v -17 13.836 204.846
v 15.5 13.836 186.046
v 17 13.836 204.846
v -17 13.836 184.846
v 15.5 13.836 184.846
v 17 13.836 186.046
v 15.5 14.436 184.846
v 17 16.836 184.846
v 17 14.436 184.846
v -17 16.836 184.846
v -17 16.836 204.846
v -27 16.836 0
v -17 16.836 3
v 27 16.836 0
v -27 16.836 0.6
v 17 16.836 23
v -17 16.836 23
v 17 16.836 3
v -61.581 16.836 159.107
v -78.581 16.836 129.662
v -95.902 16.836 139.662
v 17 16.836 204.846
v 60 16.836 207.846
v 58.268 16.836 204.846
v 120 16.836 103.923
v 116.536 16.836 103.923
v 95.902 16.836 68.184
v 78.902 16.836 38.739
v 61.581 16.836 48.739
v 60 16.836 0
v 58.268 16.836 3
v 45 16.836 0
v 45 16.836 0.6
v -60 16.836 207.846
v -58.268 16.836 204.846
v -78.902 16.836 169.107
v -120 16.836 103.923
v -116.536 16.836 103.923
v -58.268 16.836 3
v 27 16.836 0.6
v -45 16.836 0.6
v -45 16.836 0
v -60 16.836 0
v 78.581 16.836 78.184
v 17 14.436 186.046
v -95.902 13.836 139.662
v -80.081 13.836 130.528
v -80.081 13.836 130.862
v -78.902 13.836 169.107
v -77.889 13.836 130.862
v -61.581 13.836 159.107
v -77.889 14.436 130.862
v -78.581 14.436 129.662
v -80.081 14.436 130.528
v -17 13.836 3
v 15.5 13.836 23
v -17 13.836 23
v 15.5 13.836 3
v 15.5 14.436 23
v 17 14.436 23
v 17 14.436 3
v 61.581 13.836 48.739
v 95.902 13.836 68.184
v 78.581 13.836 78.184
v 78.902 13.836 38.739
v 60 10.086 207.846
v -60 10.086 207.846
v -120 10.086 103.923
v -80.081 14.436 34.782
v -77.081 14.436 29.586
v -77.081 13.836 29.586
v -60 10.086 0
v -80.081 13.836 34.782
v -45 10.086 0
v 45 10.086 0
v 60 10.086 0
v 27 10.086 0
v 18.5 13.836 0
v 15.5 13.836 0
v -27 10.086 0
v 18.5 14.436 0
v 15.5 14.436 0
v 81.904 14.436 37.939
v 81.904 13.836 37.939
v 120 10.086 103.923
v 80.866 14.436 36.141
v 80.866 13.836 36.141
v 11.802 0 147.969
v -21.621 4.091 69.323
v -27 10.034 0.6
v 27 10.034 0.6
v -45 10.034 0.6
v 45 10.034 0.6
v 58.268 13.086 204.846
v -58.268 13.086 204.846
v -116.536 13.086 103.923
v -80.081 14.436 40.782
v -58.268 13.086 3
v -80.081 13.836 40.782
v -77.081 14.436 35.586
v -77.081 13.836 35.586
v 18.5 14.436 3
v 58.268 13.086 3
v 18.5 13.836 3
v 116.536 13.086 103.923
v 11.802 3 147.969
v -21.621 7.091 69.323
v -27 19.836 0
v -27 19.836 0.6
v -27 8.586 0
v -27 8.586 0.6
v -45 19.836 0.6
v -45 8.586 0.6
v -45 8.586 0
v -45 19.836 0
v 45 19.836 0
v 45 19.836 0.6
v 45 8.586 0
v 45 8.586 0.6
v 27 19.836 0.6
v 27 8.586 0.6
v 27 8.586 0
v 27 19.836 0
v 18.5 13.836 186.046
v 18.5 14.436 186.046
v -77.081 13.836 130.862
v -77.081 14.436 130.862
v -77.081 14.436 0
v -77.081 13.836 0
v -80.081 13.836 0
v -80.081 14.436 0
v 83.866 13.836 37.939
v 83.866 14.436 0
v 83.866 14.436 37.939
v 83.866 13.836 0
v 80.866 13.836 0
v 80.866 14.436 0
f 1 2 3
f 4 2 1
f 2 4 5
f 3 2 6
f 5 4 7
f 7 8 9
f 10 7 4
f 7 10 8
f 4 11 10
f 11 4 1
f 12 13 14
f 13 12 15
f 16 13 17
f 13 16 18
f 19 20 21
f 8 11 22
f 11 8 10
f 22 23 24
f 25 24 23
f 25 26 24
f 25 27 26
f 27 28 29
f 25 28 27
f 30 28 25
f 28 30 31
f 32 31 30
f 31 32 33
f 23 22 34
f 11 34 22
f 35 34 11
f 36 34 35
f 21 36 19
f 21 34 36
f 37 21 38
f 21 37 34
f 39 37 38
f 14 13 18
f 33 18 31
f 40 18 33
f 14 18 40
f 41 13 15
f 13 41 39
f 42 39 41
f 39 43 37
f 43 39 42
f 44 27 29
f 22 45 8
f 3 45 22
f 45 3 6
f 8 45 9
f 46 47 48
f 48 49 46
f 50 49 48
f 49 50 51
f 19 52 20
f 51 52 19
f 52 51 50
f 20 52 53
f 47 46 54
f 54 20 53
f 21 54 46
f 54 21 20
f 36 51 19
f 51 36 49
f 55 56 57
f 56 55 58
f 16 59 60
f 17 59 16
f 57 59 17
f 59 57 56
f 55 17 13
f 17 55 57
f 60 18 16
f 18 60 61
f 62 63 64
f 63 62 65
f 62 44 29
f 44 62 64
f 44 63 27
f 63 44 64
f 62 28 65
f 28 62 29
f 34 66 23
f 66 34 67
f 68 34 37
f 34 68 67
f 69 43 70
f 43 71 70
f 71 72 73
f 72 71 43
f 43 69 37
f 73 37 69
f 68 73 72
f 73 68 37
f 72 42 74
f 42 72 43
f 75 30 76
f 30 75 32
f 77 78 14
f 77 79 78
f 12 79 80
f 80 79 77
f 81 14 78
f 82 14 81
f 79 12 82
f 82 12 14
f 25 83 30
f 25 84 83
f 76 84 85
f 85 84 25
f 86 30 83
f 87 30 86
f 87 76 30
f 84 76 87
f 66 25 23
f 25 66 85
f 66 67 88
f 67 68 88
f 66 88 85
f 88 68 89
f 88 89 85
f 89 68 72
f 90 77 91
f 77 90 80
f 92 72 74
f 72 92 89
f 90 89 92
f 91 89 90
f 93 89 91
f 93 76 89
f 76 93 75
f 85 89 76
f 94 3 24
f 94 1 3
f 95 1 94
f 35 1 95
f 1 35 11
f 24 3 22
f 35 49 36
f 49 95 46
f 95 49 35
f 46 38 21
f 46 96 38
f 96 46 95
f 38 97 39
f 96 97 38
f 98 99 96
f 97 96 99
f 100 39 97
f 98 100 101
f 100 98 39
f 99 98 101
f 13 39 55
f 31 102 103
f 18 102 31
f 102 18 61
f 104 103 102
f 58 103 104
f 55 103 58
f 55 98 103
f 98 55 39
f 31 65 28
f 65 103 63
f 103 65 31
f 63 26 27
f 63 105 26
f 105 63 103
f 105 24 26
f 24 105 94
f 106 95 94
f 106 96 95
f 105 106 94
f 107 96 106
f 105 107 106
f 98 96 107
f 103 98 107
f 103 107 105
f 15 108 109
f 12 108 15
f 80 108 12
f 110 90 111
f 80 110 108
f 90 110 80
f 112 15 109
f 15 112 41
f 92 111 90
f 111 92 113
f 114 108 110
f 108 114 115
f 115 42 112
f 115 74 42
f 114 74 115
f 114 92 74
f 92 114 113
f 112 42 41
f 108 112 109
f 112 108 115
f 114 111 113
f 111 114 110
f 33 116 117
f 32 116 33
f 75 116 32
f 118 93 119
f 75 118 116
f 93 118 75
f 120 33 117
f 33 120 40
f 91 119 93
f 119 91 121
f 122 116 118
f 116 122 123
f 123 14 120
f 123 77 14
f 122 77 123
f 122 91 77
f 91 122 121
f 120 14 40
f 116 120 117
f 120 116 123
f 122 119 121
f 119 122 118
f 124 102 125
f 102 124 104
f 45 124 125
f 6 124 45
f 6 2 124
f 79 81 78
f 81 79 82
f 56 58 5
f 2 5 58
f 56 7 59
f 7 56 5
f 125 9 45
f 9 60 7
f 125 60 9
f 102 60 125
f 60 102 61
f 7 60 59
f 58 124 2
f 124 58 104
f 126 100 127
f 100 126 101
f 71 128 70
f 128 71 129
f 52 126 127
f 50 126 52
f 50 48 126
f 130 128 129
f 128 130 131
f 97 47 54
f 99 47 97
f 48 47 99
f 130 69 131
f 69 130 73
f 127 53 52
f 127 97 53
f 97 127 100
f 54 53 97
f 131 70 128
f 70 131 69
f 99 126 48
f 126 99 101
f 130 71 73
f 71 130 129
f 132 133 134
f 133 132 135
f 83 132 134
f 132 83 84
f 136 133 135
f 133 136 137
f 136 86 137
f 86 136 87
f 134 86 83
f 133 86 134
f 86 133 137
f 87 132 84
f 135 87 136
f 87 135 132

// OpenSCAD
/*
    parametric_faceted_hex_wall_tile_mount_v27_multi_plate_supportless.scad
    ----------------------------------------------------------------
    Regular asymmetric low-poly hex wall tile.

    v27 goals
    ---------
    1. Multi-object plate packing is the default design target.
    2. Preserve a TRUE regular hexagon -- no X/Y stretching.
    3. Default maximum corner-to-corner width = 240 mm / 9.449 in.
    4. Vertical export rests on a complete flat hex side, not a point.
    5. Open back remains fully open.
    6. Hidden mounting pads remain clipped below the visible face.
    7. One master thickness controls shell, perimeter, and pads.
    8. Integrated low-profile sacrificial stabilizer feet are enabled by default.
    9. Automatic sacrificial anti-float fins support mounting pads that would
       otherwise begin in mid-air during vertical printing.
    10. Anti-float fins are placed on the cavity side of the mounting pads so
        the wall/adhesive-facing rear surface remains unobstructed.

    Recommended default
    -------------------
    face_size_reference      = "across_corners";
    face_size_units          = "mm";
    face_size                = 240.0;   // 9.449" maximum width

    tile_rotation_deg        = 15;

    export_orientation       = "vertical";
    vertical_edge_angle_deg  = 15;      // flat side on build plate

    master_thickness_mm      = 3.0;
    add_mount_pads           = true;
    add_mount_ribs           = false;

    // Multi-copy stability:
    add_vertical_breakaway_feet = true;
    vertical_foot_depth_mm       = 5.0;
    vertical_foot_height_mm      = 0.60;
    vertical_foot_neck_mm        = 0.80;

    Export
    ------
    F6 Render
    File -> Export -> Export as STL
*/


// =============================================================================
// CUSTOMIZER PARAMETERS
// =============================================================================


/* [Finished Face Size] */

// "bounding_square"
//     face_size is the maximum X and Y envelope.
//
// "flat_to_flat"
//     face_size is the traditional hex flat-to-flat dimension.
//
// "across_corners"
//     face_size is the regular-hex corner-to-corner dimension.
//
// v27 DEFAULT:
// across_corners = 240 mm so the vertically printed tile is about:
//     X = 240.0 mm
//     Z = 207.85 mm
// while resting on a complete flat edge.
face_size_reference = "across_corners"; // [bounding_square, flat_to_flat, across_corners]

// Units used by face_size.
face_size_units = "mm";                   // [mm, in]

// Default = 240 mm / 9.449 in maximum corner-to-corner width.
// This leaves useful X-axis margin on a 256 mm plate.
face_size = 240.0;

// Rotation of the finished hex within its face plane.
//
// IMPORTANT:
// 15 degrees gives a regular hex an equal X/Y bounding envelope.
// With bounding_square + 254 mm this produces approximately:
//     X = 254.0 mm
//     Y = 254.0 mm
tile_rotation_deg = 15;


/* [Export / Print Orientation] */

// "flat"     = conventional CAD orientation; decorative face points +Z.
// "vertical" = rotate final part onto an edge for vertical printing.
export_orientation = "vertical";          // [flat, vertical]

// Additional in-plane rotation used ONLY before standing the part vertically.
//
// IMPORTANT:
// The finished face uses tile_rotation_deg = 15 so its X/Y envelope is exactly
// square. A regular hex rests on a FLAT SIDE when its effective print-plane
// rotation is 30 degrees (modulo 60 degrees).
//
// Therefore the default vertical export adds another 15 degrees:
//
//     15 deg finished-face rotation
//   + 15 deg vertical export rotation
//   = 30 deg effective print rotation
//
// This puts a complete flat hex side on the build plate instead of a point.
// The transformed model is automatically translated so that side rests at Z=0.
// Rotate the finished 15-degree face orientation another 15 degrees before
// standing it up. 15 + 15 = 30 degrees, which places a complete hex side
// horizontally at the bottom rather than balancing the tile on a vertex.
vertical_edge_angle_deg = 15;

// Add small breakaway stabilizer feet after the model is stood vertically.
// Normally leave OFF and use a slicer brim if required.
add_vertical_breakaway_feet = true;

// Breakaway-foot dimensions.
vertical_foot_length_mm = 18.0;
vertical_foot_depth_mm = 5.0;
vertical_foot_height_mm = 0.60;
vertical_foot_neck_mm = 0.80;


/* [MASTER THICKNESS] */

// Main material thickness control.
master_thickness_mm = 3.0;

// Optional tuning multipliers.
front_shell_multiplier = 1.0;
perimeter_multiplier   = 1.0;
mount_pad_multiplier   = 1.0;


/* [Front Relief] */

// "proportional" scales relief with the true flat-to-flat dimension.
// "absolute" uses explicit millimeter values.
relief_height_mode = "proportional";      // [proportional, absolute]

relief_scale = 1.0;

// Relative relief proportions.
peak_height_ratio = 0.081;
ridge_to_peak_ratio = 0.757;
edge_to_peak_ratio = 0.097;

// Used only in absolute mode.
peak_height_mm   = 18.5;
ridge_height_mm = 14.0;
edge_height_mm  = 1.8;

// Minimum air gap between inner roof and mounting geometry.
edge_clearance_mm = 0.60;


/* [Facet Layout] */

peak_angle_deg = 45;
peak_radius_ratio = 0.38;

ridge_angle_deg = 208;
ridge_radius_ratio = 0.34;


/* [Wall Mounting] */

add_mount_pads = true;

// Width parallel to local hex edge.
mount_pad_width_mm = 34.0;

// Radial depth into the cavity.
mount_pad_depth_mm = 24.0;

// Structural overlap beneath the inner perimeter shell.
mount_pad_overlap_mm = 4.0;

// Pull mounting geometry inward from the visible outside perimeter.
 // Keep this smaller than the perimeter-wall thickness so the pad still
 // overlaps the wall by a positive amount.
// IMPORTANT:
 // Must be LESS than perimeter_wall_thickness_mm so the pads physically
 // overlap the perimeter wall and become one connected solid.
 mount_pad_edge_inset_mm = 1.0;

// Clearance below underside of visible face.
mount_face_clearance_mm = 0.75;

// Mount-pad directions in the tile's local coordinate system.
mount_pad_angles = [60, 120, 240, 300];


/* [Mount Reinforcement] */

add_mount_ribs = false;

mount_rib_width_mm  = 3.0;
mount_rib_height_mm = 5.0;
mount_rib_depth_mm  = 8.0;


/* [Optional Screw Holes] */

add_pad_screw_holes = false;

pad_screw_hole_diameter_mm = 4.5;



/* [Plate Packing Guidance] */

// These values do NOT duplicate objects inside the STL.
// They provide planning numbers in the OpenSCAD console for arranging
// multiple copies in the slicer.
//
// Typical X2D-style plate planning:
//   usable Y = 256 mm
//   keep a conservative front/rear margin
plate_depth_mm = 256.0;

plate_front_margin_mm = 8.0;
plate_rear_margin_mm  = 8.0;

// Recommended empty gap between adjacent standing tiles.
// Increase if using aggressive acceleration or if the printer has noticeable
// resonance/wobble on tall parts.
recommended_inter_tile_gap_mm = 8.0;

// Feet extend from Y=0 to vertical_foot_depth_mm.
// The actual tile relief occupies approximately peak_height in Y.
// Packing pitch uses whichever is deeper, plus the inter-tile gap.


/* [Vertical Anti-Float Supports] */

// Vertical printing turns some rear mounting pads into islands that can begin
// above the build plate before they intersect the perimeter wall.
//
// When enabled, v27 adds thin sacrificial fins from Z=0 up to the first layer
// of each elevated pad. These fins sit on the cavity side of the pad, not on
// the wall/adhesive-facing rear plane.
add_vertical_antifloat_fins = true;

// X width of each sacrificial fin.
antifloat_fin_width_mm = 3.0;

// Thickness into the cavity side of the mounting pad.
// 0.60 mm is thin enough to snap/cut away easily.
antifloat_fin_thickness_mm = 0.60;

// How far the fin overlaps upward into the mounting pad.
antifloat_fin_overlap_mm = 1.20;

// Ignore pads whose lowest point is already essentially on the build plate.
antifloat_min_height_mm = 0.80;


/* [Advanced] */

polyhedron_convexity = 12;
screw_hole_fn = 40;

// Small numerical tolerance.
eps = 0.01;


// =============================================================================
// HELPERS
// =============================================================================

function polar(angle_deg, radius) =
    [
        radius * cos(angle_deg),
        radius * sin(angle_deg)
    ];

function hex_vertex_unrotated(i, radius) =
    [
        radius * cos(30 + i * 60),
        radius * sin(30 + i * 60)
    ];

function rotate2d(p, angle_deg) =
    [
        p[0] * cos(angle_deg) - p[1] * sin(angle_deg),
        p[0] * sin(angle_deg) + p[1] * cos(angle_deg)
    ];


// Position of a raw mount-pad corner after all in-plane rotations used by the
// vertical export. Returned as [final_X, final_Z] because after rotate X=90,
// original in-plane Y becomes print Z.
function mount_print_corner(angle_deg, radial_r, lateral_t) =
    let(
        theta =
            angle_deg
            + tile_rotation_deg
            + vertical_edge_angle_deg
    )
    [
        radial_r * cos(theta) - lateral_t * sin(theta),
        vertical_half_y
            + radial_r * sin(theta)
            + lateral_t * cos(theta)
    ];

function mount_print_corners(angle_deg) =
    [
        mount_print_corner(
            angle_deg,
            mount_pad_inner_r,
            -mount_pad_width_mm / 2
        ),
        mount_print_corner(
            angle_deg,
            mount_pad_inner_r,
             mount_pad_width_mm / 2
        ),
        mount_print_corner(
            angle_deg,
            mount_pad_desired_outer_r,
            -mount_pad_width_mm / 2
        ),
        mount_print_corner(
            angle_deg,
            mount_pad_desired_outer_r,
             mount_pad_width_mm / 2
        )
    ];

function mount_corner_z_values(angle_deg) =
    [
        for (p = mount_print_corners(angle_deg))
            p[1]
    ];

function mount_lowest_z(angle_deg) =
    min(mount_corner_z_values(angle_deg));

function mount_lowest_corner_index(angle_deg) =
    search(
        mount_lowest_z(angle_deg),
        mount_corner_z_values(angle_deg)
    )[0];

function mount_lowest_x(angle_deg) =
    mount_print_corners(angle_deg)[
        mount_lowest_corner_index(angle_deg)
    ][0];

function hex_vertex(i, radius) =
    rotate2d(
        hex_vertex_unrotated(i, radius),
        tile_rotation_deg
    );

// Half-width / half-height of a unit-circumradius rotated regular hex.
function unit_hex_half_x(rotation_deg) =
    max([
        for (i = [0 : 5])
            abs(
                cos(30 + i * 60 + rotation_deg)
            )
    ]);

function unit_hex_half_y(rotation_deg) =
    max([
        for (i = [0 : 5])
            abs(
                sin(30 + i * 60 + rotation_deg)
            )
    ]);

// Bounding box of a regular hex with circumradius r.
function hex_bbox_x(r, rotation_deg) =
    2 * r * unit_hex_half_x(rotation_deg);

function hex_bbox_y(r, rotation_deg) =
    2 * r * unit_hex_half_y(rotation_deg);


// =============================================================================
// DERIVED MATERIAL THICKNESSES
// =============================================================================

front_shell_thickness_mm =
    master_thickness_mm * front_shell_multiplier;

perimeter_wall_thickness_mm =
    master_thickness_mm * perimeter_multiplier;

mount_pad_thickness_mm =
    master_thickness_mm * mount_pad_multiplier;


// =============================================================================
// DERIVED FACE DIMENSIONS
// =============================================================================

_face_size_mm =
    face_size_units == "in"
        ? face_size * 25.4
        : face_size;

// If bounding_square is selected, choose the largest regular-hex radius that
// fits inside both the requested X and Y dimensions.
//
// At tile_rotation_deg = 15, unit X and Y extents are equal, so both dimensions
// become exactly face_size.
r_outer =
    face_size_reference == "flat_to_flat"
        ? (_face_size_mm / 2) / cos(30)
        : face_size_reference == "across_corners"
            ? _face_size_mm / 2
            : min(
                _face_size_mm / (2 * unit_hex_half_x(tile_rotation_deg)),
                _face_size_mm / (2 * unit_hex_half_y(tile_rotation_deg))
              );

tile_flat_to_flat =
    2 * r_outer * cos(30);

tile_across_corners =
    2 * r_outer;

finished_bbox_x =
    hex_bbox_x(r_outer, tile_rotation_deg);

finished_bbox_y =
    hex_bbox_y(r_outer, tile_rotation_deg);

outer_apothem =
    tile_flat_to_flat / 2;

inner_apothem =
    outer_apothem - perimeter_wall_thickness_mm;

r_inner =
    inner_apothem / cos(30);

inner_flat_length =
    2 * inner_apothem * tan(30);

hex_side_length =
    r_outer;


// =============================================================================
// DERIVED RELIEF HEIGHTS
// =============================================================================

_peak_unscaled =
    relief_height_mode == "proportional"
        ? tile_flat_to_flat * peak_height_ratio
        : peak_height_mm;

_ridge_unscaled =
    relief_height_mode == "proportional"
        ? _peak_unscaled * ridge_to_peak_ratio
        : ridge_height_mm;

_requested_edge_unscaled =
    relief_height_mode == "proportional"
        ? _peak_unscaled * edge_to_peak_ratio
        : edge_height_mm;

peak_height =
    _peak_unscaled * relief_scale;

ridge_height =
    _ridge_unscaled * relief_scale;

requested_edge_height =
    _requested_edge_unscaled * relief_scale;

// Enough vertical room for front shell + complete pad + clearance.
minimum_edge_height =
    front_shell_thickness_mm
    + mount_pad_thickness_mm
    + mount_face_clearance_mm;

edge_height =
    max(
        requested_edge_height,
        minimum_edge_height
    );


// =============================================================================
// DERIVED MOUNTING GEOMETRY
// =============================================================================

mount_pad_desired_outer_r =
    inner_apothem + mount_pad_overlap_mm;

mount_pad_inner_r =
    mount_pad_desired_outer_r - mount_pad_depth_mm;

mount_pad_center_r =
    mount_pad_desired_outer_r - mount_pad_depth_mm / 2;

mount_clip_apothem =
    outer_apothem - mount_pad_edge_inset_mm;

mount_clip_radius =
    mount_clip_apothem / cos(30);


// =============================================================================
// VERTICAL-EXPORT DERIVED VALUES
// =============================================================================
//
// The tile is first rotated around Z by vertical_edge_angle_deg, then stood up
// by +90 degrees around X.
//
// We calculate the local Y envelope AFTER that optional Z rotation so the
// final model can be translated to put its lowest point exactly on Z=0.

vertical_rotation_total_deg =
    vertical_edge_angle_deg;

vertical_half_y =
    max([
        for (i = [0 : 5])
            abs(
                r_outer
                * sin(
                    30
                    + i * 60
                    + tile_rotation_deg
                    + vertical_rotation_total_deg
                )
            )
    ]);

vertical_print_height =
    2 * vertical_half_y;

// After rotate([90,0,0]), original +Z becomes -Y.
// Translate by peak_height so all relief lies in positive Y.
vertical_print_depth =
    peak_height;

// Multi-copy packing envelope in Y.
//
// vertical_tile() occupies approximately peak_height of Y-depth.
// Breakaway feet occupy vertical_foot_depth_mm.
// Use the larger dimension as the per-part physical depth.
vertical_object_depth =
    add_vertical_breakaway_feet
        ? vertical_print_depth + 3.0
        : vertical_print_depth;

recommended_copy_pitch_y =
    vertical_object_depth + recommended_inter_tile_gap_mm;

usable_plate_depth =
    plate_depth_mm
    - plate_front_margin_mm
    - plate_rear_margin_mm;

estimated_copies_per_plate_depth =
    max(
        1,
        floor(
            (
                usable_plate_depth
                + recommended_inter_tile_gap_mm
            )
            / recommended_copy_pitch_y
        )
    );


// =============================================================================
// VALIDATION
// =============================================================================

assert(
    _face_size_mm > 0,
    "face_size must produce a positive dimension."
);

assert(
    master_thickness_mm > 0,
    "master_thickness_mm must be greater than zero."
);

assert(
    front_shell_multiplier > 0
    && perimeter_multiplier > 0
    && mount_pad_multiplier > 0,
    "All thickness multipliers must be greater than zero."
);

assert(
    front_shell_thickness_mm > 0,
    "front_shell_thickness_mm must be greater than zero."
);

assert(
    perimeter_wall_thickness_mm > 0,
    "perimeter_wall_thickness_mm must be greater than zero."
);

assert(
    perimeter_wall_thickness_mm < outer_apothem,
    "perimeter_wall_thickness_mm is too large for this tile."
);

assert(
    inner_apothem > 0,
    "The selected perimeter wall leaves no hollow interior."
);

assert(
    edge_height > front_shell_thickness_mm,
    "Internal error: edge_height must exceed front_shell_thickness_mm."
);

assert(
    ridge_height > edge_height,
    "ridge_height must remain greater than the effective edge height."
);

assert(
    peak_height > ridge_height,
    "peak_height must remain greater than ridge_height."
);

assert(
    peak_radius_ratio > 0 && peak_radius_ratio < 0.90,
    "peak_radius_ratio must be between 0 and 0.90."
);

assert(
    ridge_radius_ratio > 0 && ridge_radius_ratio < 0.90,
    "ridge_radius_ratio must be between 0 and 0.90."
);

assert(
    mount_pad_width_mm > 0,
    "mount_pad_width_mm must be greater than zero."
);

assert(
    mount_pad_depth_mm > 0,
    "mount_pad_depth_mm must be greater than zero."
);

assert(
    mount_pad_thickness_mm > 0,
    "mount_pad_thickness_mm must be greater than zero."
);

assert(
    mount_pad_overlap_mm >= 0,
    "mount_pad_overlap_mm cannot be negative."
);

assert(
    mount_pad_edge_inset_mm >= 0,
    "mount_pad_edge_inset_mm cannot be negative."
);

assert(
    mount_pad_edge_inset_mm < perimeter_wall_thickness_mm,
    "mount_pad_edge_inset_mm must be smaller than perimeter_wall_thickness_mm so mounting pads overlap and join the perimeter wall."
);

assert(
    mount_face_clearance_mm >= 0,
    "mount_face_clearance_mm cannot be negative."
);

assert(
    mount_clip_apothem > 0,
    "mount_pad_edge_inset_mm is too large."
);

assert(
    mount_pad_inner_r > 0,
    "mount_pad_depth_mm is too large and reaches/passes the tile center."
);

assert(
    !add_pad_screw_holes
    || pad_screw_hole_diameter_mm < mount_pad_width_mm * 0.75,
    "pad_screw_hole_diameter_mm is too large for the mounting pad."
);

assert(
    !add_mount_ribs
    || mount_rib_height_mm > 0,
    "mount_rib_height_mm must be greater than zero."
);

assert(
    !add_vertical_breakaway_feet
    || export_orientation == "vertical",
    "Vertical breakaway feet require export_orientation = \"vertical\"."
);

assert(
    plate_depth_mm > 0,
    "plate_depth_mm must be greater than zero."
);

assert(
    plate_front_margin_mm >= 0
    && plate_rear_margin_mm >= 0,
    "Plate margins cannot be negative."
);

assert(
    recommended_inter_tile_gap_mm >= 0,
    "recommended_inter_tile_gap_mm cannot be negative."
);

assert(
    usable_plate_depth > 0,
    "Plate margins leave no usable plate depth."
);


assert(
    antifloat_fin_width_mm > 0,
    "antifloat_fin_width_mm must be greater than zero."
);

assert(
    antifloat_fin_thickness_mm > 0
    && antifloat_fin_thickness_mm <= mount_pad_thickness_mm,
    "antifloat_fin_thickness_mm must be > 0 and no thicker than the mounting pad."
);

assert(
    antifloat_fin_overlap_mm > 0,
    "antifloat_fin_overlap_mm must be greater than zero."
);


// =============================================================================
// DIAGNOSTIC OUTPUT
// =============================================================================

echo("====================================================");
echo("FACETED HEX WALL TILE v27 - MULTI-PLATE / SUPPORTLESS VERTICAL");
echo("====================================================");

echo(str("face size reference      : ", face_size_reference));
echo(str("requested face size      : ", _face_size_mm, " mm"));
echo(str("tile rotation            : ", tile_rotation_deg, " deg"));

echo(str("finished bbox X          : ", finished_bbox_x, " mm"));
echo(str("finished bbox Y          : ", finished_bbox_y, " mm"));
echo(str("finished bbox X inches   : ", finished_bbox_x / 25.4, " in"));
echo(str("finished bbox Y inches   : ", finished_bbox_y / 25.4, " in"));

echo(str("flat-to-flat             : ", tile_flat_to_flat, " mm"));
echo(str("across-corners           : ", tile_across_corners, " mm"));
echo(str("hex side length          : ", hex_side_length, " mm"));

echo(str("MASTER thickness         : ", master_thickness_mm, " mm"));
echo(str("actual front shell       : ", front_shell_thickness_mm, " mm"));
echo(str("actual perimeter wall    : ", perimeter_wall_thickness_mm, " mm"));
echo(str("actual mount pad         : ", mount_pad_thickness_mm, " mm"));

echo(str("requested edge height    : ", requested_edge_height, " mm"));
echo(str("minimum edge height      : ", minimum_edge_height, " mm"));
echo(str("EFFECTIVE edge height    : ", edge_height, " mm"));

echo(str("ridge height             : ", ridge_height, " mm"));
echo(str("peak height              : ", peak_height, " mm"));
echo(str("peak height inches       : ", peak_height / 25.4, " in"));

echo(str("mount pad width          : ", mount_pad_width_mm, " mm"));
echo(str("mount pad depth          : ", mount_pad_depth_mm, " mm"));
echo(str("mount pad thickness      : ", mount_pad_thickness_mm, " mm"));
echo(str("mount pad overlap        : ", mount_pad_overlap_mm, " mm"));
echo(str("mount edge inset         : ", mount_pad_edge_inset_mm, " mm"));
echo(str("mount/face clearance     : ", mount_face_clearance_mm, " mm"));

echo(str("export orientation       : ", export_orientation));

if (
    export_orientation == "vertical"
    && add_mount_pads
    && add_vertical_antifloat_fins
) {
    for (a = mount_pad_angles)
        echo(
            str(
                "mount pad ",
                a,
                " deg lowest print Z : ",
                mount_lowest_z(a),
                " mm"
            )
        );
}

echo(str("vertical extra rotation  : ", vertical_edge_angle_deg, " deg"));
echo(str("effective print rotation : ",
         tile_rotation_deg + vertical_edge_angle_deg, " deg"));

if (export_orientation == "vertical"
    && abs(
        ((tile_rotation_deg + vertical_edge_angle_deg) % 60) - 30
    ) < 0.001)
    echo("build-plate contact      : FLAT HEX SIDE");
else if (export_orientation == "vertical")
    echo("build-plate contact      : WARNING - NOT EXACTLY FLAT-SIDE DOWN");

if (export_orientation == "vertical") {
    echo(str("vertical print height    : ", vertical_print_height, " mm"));
    echo(str("vertical relief depth    : ", vertical_print_depth, " mm"));
    echo(str("vertical object depth    : ", vertical_object_depth, " mm"));
    echo(str("recommended Y gap        : ", recommended_inter_tile_gap_mm, " mm"));
    echo(str("recommended Y pitch      : ", recommended_copy_pitch_y, " mm"));
    echo(str("usable plate Y depth     : ", usable_plate_depth, " mm"));
    echo(str("estimated copies in Y    : ", estimated_copies_per_plate_depth));
}

if (edge_height > requested_edge_height)
    echo(
        str(
            "AUTO EDGE FIX ACTIVE: edge raised from ",
            requested_edge_height,
            " mm to ",
            edge_height,
            " mm."
        )
    );

echo("====================================================");


// =============================================================================
// FRONT RELIEF CONTROL POINTS
// =============================================================================

P_xy =
    polar(
        peak_angle_deg + tile_rotation_deg,
        r_outer * peak_radius_ratio
    );

Q_xy =
    polar(
        ridge_angle_deg + tile_rotation_deg,
        r_outer * ridge_radius_ratio
    );


// =============================================================================
// SHELL VERTICES
// =============================================================================

points =
    concat(

        // 0..5 : outer rear perimeter
        [
            for (i = [0 : 5])
                let(p = hex_vertex(i, r_outer))
                [p[0], p[1], 0]
        ],

        // 6..11 : outer front perimeter
        [
            for (i = [0 : 5])
                let(p = hex_vertex(i, r_outer))
                [p[0], p[1], edge_height]
        ],

        // 12..13 : outer peak / ridge
        [
            [P_xy[0], P_xy[1], peak_height],
            [Q_xy[0], Q_xy[1], ridge_height]
        ],

        // 14..19 : inner rear perimeter
        [
            for (i = [0 : 5])
                let(p = hex_vertex(i, r_inner))
                [p[0], p[1], 0]
        ],

        // 20..25 : inner front perimeter
        [
            for (i = [0 : 5])
                let(p = hex_vertex(i, r_inner))
                [p[0], p[1], edge_height - front_shell_thickness_mm]
        ],

        // 26..27 : inner peak / ridge
        [
            [
                P_xy[0],
                P_xy[1],
                peak_height - front_shell_thickness_mm
            ],
            [
                Q_xy[0],
                Q_xy[1],
                ridge_height - front_shell_thickness_mm
            ]
        ]
    );


// =============================================================================
// SHELL FACES
// =============================================================================

outer_roof_faces = [
    [6, 7, 12],
    [7, 8, 12],
    [6, 12, 11],

    [8, 13, 12],
    [11, 12, 13],

    [8, 9, 13],
    [9, 10, 13],
    [10, 11, 13]
];

inner_roof_faces = [
    [26, 21, 20],
    [26, 22, 21],
    [25, 26, 20],

    [26, 27, 22],
    [27, 26, 25],

    [27, 23, 22],
    [27, 24, 23],
    [27, 25, 24]
];

faces =
    concat(

        // Outer vertical perimeter
        [
            for (i = [0 : 5])
                [
                    i,
                    (i + 1) % 6,
                    6 + (i + 1) % 6,
                    6 + i
                ]
        ],

        outer_roof_faces,

        // Inner vertical perimeter
        [
            for (i = [0 : 5])
                [
                    14 + i,
                    20 + i,
                    20 + (i + 1) % 6,
                    14 + (i + 1) % 6
                ]
        ],

        inner_roof_faces,

        // Narrow rear perimeter ring only.
        // Center remains fully open.
        [
            for (i = [0 : 5])
                [
                    i,
                    14 + i,
                    14 + (i + 1) % 6,
                    (i + 1) % 6
                ]
        ]
    );


// =============================================================================
// TILE SHELL
// =============================================================================

module tile_shell() {
    polyhedron(
        points = points,
        faces = faces,
        convexity = polyhedron_convexity
    );
}


// =============================================================================
// SAFE MOUNTING VOLUME BELOW FRONT FACE
// =============================================================================

safe_edge_z =
    max(
        eps,
        edge_height
        - front_shell_thickness_mm
        - mount_face_clearance_mm
    );

safe_peak_z =
    max(
        eps,
        peak_height
        - front_shell_thickness_mm
        - mount_face_clearance_mm
    );

safe_ridge_z =
    max(
        eps,
        ridge_height
        - front_shell_thickness_mm
        - mount_face_clearance_mm
    );

safe_mount_points =
    concat(

        // 0..5 : rear outer perimeter
        [
            for (i = [0 : 5])
                let(p = hex_vertex(i, r_outer))
                [p[0], p[1], 0]
        ],

        // 6..11 : safe ceiling at outer perimeter
        [
            for (i = [0 : 5])
                let(p = hex_vertex(i, r_outer))
                [p[0], p[1], safe_edge_z]
        ],

        // 12..13 : safe ceiling under peak/ridge
        [
            [P_xy[0], P_xy[1], safe_peak_z],
            [Q_xy[0], Q_xy[1], safe_ridge_z]
        ]
    );

safe_mount_ceiling_faces = [
    [6, 7, 12],
    [7, 8, 12],
    [6, 12, 11],
    [8, 13, 12],
    [11, 12, 13],
    [8, 9, 13],
    [9, 10, 13],
    [10, 11, 13]
];

safe_mount_faces =
    concat(

        // Outer side walls.
        [
            for (i = [0 : 5])
                [
                    i,
                    (i + 1) % 6,
                    6 + (i + 1) % 6,
                    6 + i
                ]
        ],

        // Sloped safe ceiling.
        safe_mount_ceiling_faces,

        // Rear floor used only to close clipping volume.
        [[5, 4, 3, 2, 1, 0]]
    );

module safe_mount_volume() {
    polyhedron(
        points = safe_mount_points,
        faces = safe_mount_faces,
        convexity = polyhedron_convexity
    );
}


// =============================================================================
// HEX FOOTPRINT FOR MOUNT CLIPPING
// =============================================================================

module mount_clip_volume(height_mm) {
    linear_extrude(height = height_mm)
        polygon(
            points = [
                for (i = [0 : 5])
                    hex_vertex(i, mount_clip_radius)
            ]
        );
}


// =============================================================================
// RAW MOUNT PAD
// =============================================================================
//
// Mount-pad angles are local tile angles. tile_rotation_deg is applied so the
// pads remain attached to the same visual positions when the face rotates.

module raw_mount_pad(angle_deg) {
    rotate([0, 0, angle_deg + tile_rotation_deg])
        translate(
            [
                mount_pad_inner_r,
                -mount_pad_width_mm / 2,
                0
            ]
        )
            cube(
                [
                    mount_pad_depth_mm,
                    mount_pad_width_mm,
                    mount_pad_thickness_mm
                ]
            );
}


// =============================================================================
// CLIPPED MOUNT PAD
// =============================================================================

module mount_pad(angle_deg) {
    intersection() {

        raw_mount_pad(angle_deg);

        // Keep pad inside inset hex footprint.
        mount_clip_volume(
            mount_pad_thickness_mm + eps
        );

        // Hard stop below underside of front shell.
        safe_mount_volume();
    }
}


// =============================================================================
// OPTIONAL REINFORCING RIBS
// =============================================================================

module raw_mount_ribs(angle_deg) {

    rib_center_r =
        mount_pad_desired_outer_r
        - mount_rib_depth_mm / 2;

    rib_side_offset =
        max(
            0,
            mount_pad_width_mm / 2
            - mount_rib_width_mm
            - 2
        );

    rotate([0, 0, angle_deg + tile_rotation_deg]) {

        for (side = [-1, 1]) {

            translate(
                [
                    rib_center_r - mount_rib_depth_mm / 2,
                    side * rib_side_offset - mount_rib_width_mm / 2,
                    mount_pad_thickness_mm
                ]
            )

            rotate([90, 0, 90])

            linear_extrude(height = mount_rib_depth_mm)

            polygon(
                points = [
                    [0, 0],
                    [mount_rib_width_mm, 0],
                    [mount_rib_width_mm, mount_rib_height_mm],
                    [0, 0]
                ]
            );
        }
    }
}

module mount_ribs(angle_deg) {
    intersection() {

        raw_mount_ribs(angle_deg);

        mount_clip_volume(
            mount_pad_thickness_mm
            + mount_rib_height_mm
            + 0.1
        );

        safe_mount_volume();
    }
}


// =============================================================================
// OPTIONAL SCREW HOLE
// =============================================================================

module pad_screw_hole(angle_deg) {

    rotate([0, 0, angle_deg + tile_rotation_deg])

        translate(
            [
                mount_pad_center_r,
                0,
                -1
            ]
        )

            cylinder(
                d = pad_screw_hole_diameter_mm,
                h =
                    mount_pad_thickness_mm
                    + mount_rib_height_mm
                    + 2,
                $fn = screw_hole_fn
            );
}


// =============================================================================
// COMPLETE FINISHED TILE
// =============================================================================

module finished_tile() {

    difference() {

        union() {

            tile_shell();

            if (add_mount_pads) {

                for (a = mount_pad_angles) {

                    mount_pad(a);

                    if (add_mount_ribs)
                        mount_ribs(a);
                }
            }
        }

        if (
            add_mount_pads
            && add_pad_screw_holes
        ) {

            for (a = mount_pad_angles)
                pad_screw_hole(a);
        }
    }
}


// =============================================================================
// VERTICAL-PRINT TRANSFORM
// =============================================================================
//
// Transform order in OpenSCAD is inside-out:
//
// 1. finished_tile()
// 2. optional extra Z rotation for selecting another edge
// 3. rotate +90 degrees around X so the face stands vertically
// 4. translate so:
//      - relief depth occupies positive Y
//      - lowest tile point is exactly at Z=0

module vertical_tile() {

    translate(
        [
            0,
            peak_height,
            vertical_half_y
        ]
    )

    rotate([90, 0, 0])

    rotate([0, 0, vertical_edge_angle_deg])

        finished_tile();
}


// =============================================================================
// OPTIONAL BREAKAWAY VERTICAL FEET
// =============================================================================
//
// These are intentionally simple sacrificial tabs.
// They are added only in vertical export mode.
// Leave OFF unless a brim alone is not sufficient.

module vertical_breakaway_feet() {

    /*
        CONNECTED stabilizer feet.

        For flat-side-down vertical export, the bottom perimeter wall occupies
        approximately:

            Y = peak_height - edge_height  ...  peak_height

        and the bottom flat side spans roughly one hex-side length in X.

        The v25 feet were placed near Y=0 and too far outward in X, so they
        could become disconnected solids. v26 deliberately overlaps the
        actual bottom perimeter wall in both X and Y.

        The tabs extend only a few millimeters beyond the rear face, keeping
        Y-depth compact for multi-copy plate packing.
    */

    foot_center_x =
        hex_side_length * 0.30;

    // Safely inside the actual bottom flat-edge span.
    foot_length_x =
        min(
            vertical_foot_length_mm,
            hex_side_length * 0.25
        );

    // Bottom perimeter wall depth after the vertical transform.
    bottom_wall_y_min =
        peak_height - edge_height;

    bottom_wall_y_max =
        peak_height;

    // Extend a little toward the decorative face and a little behind the tile.
    foot_y_min =
        max(
            0,
            bottom_wall_y_min - 1.5
        );

    foot_y_max =
        bottom_wall_y_max + 3.0;

    attached_foot_depth =
        foot_y_max - foot_y_min;

    for (x = [-foot_center_x, foot_center_x]) {

        // Main shallow sacrificial pad.
        //
        // It overlaps the lower perimeter wall in volume, so CGAL produces
        // one connected body instead of merely touching at a plane.
        translate(
            [
                x - foot_length_x / 2,
                foot_y_min,
                0
            ]
        )
            cube(
                [
                    foot_length_x,
                    attached_foot_depth,
                    vertical_foot_height_mm
                ]
            );

        // Small reinforcing neck rising into the bottom perimeter wall.
        translate(
            [
                x - vertical_foot_neck_mm / 2,
                bottom_wall_y_min,
                0
            ]
        )
            cube(
                [
                    vertical_foot_neck_mm,
                    edge_height,
                    min(3.0, perimeter_wall_thickness_mm)
                ]
            );
    }
}



// =============================================================================
// AUTOMATIC VERTICAL ANTI-FLOAT FINS
// =============================================================================
//
// These are PRINTING AIDS, not structural mounting features.
//
// A fin is generated only when the raw mounting pad has a lowest point above
// the build plate. The fin is positioned under that lowest corner so the pad
// never appears as a new unsupported island during slicing.
//
// Final vertical coordinate mapping:
//   original model Z=0 rear surface  -> final Y = peak_height
//   original model Z=pad thickness  -> final Y = peak_height - pad thickness
//
// Therefore the cavity-side edge of a mounting pad is:
//   Y = peak_height - mount_pad_thickness_mm
//
// The fin occupies only a thin strip from that cavity-side edge inward.

module vertical_antifloat_fin(angle_deg) {

    lowest_z = mount_lowest_z(angle_deg);
    lowest_x = mount_lowest_x(angle_deg);

    if (lowest_z > antifloat_min_height_mm) {

        fin_y =
            peak_height
            - mount_pad_thickness_mm;

        fin_height =
            lowest_z
            + antifloat_fin_overlap_mm;

        translate(
            [
                lowest_x - antifloat_fin_width_mm / 2,
                fin_y,
                0
            ]
        )
            cube(
                [
                    antifloat_fin_width_mm,
                    antifloat_fin_thickness_mm,
                    fin_height
                ]
            );
    }
}

module vertical_antifloat_fins() {

    if (
        export_orientation == "vertical"
        && add_mount_pads
        && add_vertical_antifloat_fins
    ) {
        for (a = mount_pad_angles)
            vertical_antifloat_fin(a);
    }
}


// =============================================================================
// OUTPUT
// =============================================================================
//
// Default v27 exported STL target:
//   X ~ 240.00 mm  / 9.449 in
//   Y ~ relief depth (~17-19 mm depending on relief settings)
//   Z ~ 207.85 mm  / 8.183 in
//
// Multiple copies should be duplicated and arrayed along Y in the slicer.

module output_model() {

    if (export_orientation == "vertical") {

        union() {

            vertical_tile();

            if (add_vertical_breakaway_feet)
                vertical_breakaway_feet();

            vertical_antifloat_fins();
        }

    } else {

        finished_tile();
    }
}

output_model();
